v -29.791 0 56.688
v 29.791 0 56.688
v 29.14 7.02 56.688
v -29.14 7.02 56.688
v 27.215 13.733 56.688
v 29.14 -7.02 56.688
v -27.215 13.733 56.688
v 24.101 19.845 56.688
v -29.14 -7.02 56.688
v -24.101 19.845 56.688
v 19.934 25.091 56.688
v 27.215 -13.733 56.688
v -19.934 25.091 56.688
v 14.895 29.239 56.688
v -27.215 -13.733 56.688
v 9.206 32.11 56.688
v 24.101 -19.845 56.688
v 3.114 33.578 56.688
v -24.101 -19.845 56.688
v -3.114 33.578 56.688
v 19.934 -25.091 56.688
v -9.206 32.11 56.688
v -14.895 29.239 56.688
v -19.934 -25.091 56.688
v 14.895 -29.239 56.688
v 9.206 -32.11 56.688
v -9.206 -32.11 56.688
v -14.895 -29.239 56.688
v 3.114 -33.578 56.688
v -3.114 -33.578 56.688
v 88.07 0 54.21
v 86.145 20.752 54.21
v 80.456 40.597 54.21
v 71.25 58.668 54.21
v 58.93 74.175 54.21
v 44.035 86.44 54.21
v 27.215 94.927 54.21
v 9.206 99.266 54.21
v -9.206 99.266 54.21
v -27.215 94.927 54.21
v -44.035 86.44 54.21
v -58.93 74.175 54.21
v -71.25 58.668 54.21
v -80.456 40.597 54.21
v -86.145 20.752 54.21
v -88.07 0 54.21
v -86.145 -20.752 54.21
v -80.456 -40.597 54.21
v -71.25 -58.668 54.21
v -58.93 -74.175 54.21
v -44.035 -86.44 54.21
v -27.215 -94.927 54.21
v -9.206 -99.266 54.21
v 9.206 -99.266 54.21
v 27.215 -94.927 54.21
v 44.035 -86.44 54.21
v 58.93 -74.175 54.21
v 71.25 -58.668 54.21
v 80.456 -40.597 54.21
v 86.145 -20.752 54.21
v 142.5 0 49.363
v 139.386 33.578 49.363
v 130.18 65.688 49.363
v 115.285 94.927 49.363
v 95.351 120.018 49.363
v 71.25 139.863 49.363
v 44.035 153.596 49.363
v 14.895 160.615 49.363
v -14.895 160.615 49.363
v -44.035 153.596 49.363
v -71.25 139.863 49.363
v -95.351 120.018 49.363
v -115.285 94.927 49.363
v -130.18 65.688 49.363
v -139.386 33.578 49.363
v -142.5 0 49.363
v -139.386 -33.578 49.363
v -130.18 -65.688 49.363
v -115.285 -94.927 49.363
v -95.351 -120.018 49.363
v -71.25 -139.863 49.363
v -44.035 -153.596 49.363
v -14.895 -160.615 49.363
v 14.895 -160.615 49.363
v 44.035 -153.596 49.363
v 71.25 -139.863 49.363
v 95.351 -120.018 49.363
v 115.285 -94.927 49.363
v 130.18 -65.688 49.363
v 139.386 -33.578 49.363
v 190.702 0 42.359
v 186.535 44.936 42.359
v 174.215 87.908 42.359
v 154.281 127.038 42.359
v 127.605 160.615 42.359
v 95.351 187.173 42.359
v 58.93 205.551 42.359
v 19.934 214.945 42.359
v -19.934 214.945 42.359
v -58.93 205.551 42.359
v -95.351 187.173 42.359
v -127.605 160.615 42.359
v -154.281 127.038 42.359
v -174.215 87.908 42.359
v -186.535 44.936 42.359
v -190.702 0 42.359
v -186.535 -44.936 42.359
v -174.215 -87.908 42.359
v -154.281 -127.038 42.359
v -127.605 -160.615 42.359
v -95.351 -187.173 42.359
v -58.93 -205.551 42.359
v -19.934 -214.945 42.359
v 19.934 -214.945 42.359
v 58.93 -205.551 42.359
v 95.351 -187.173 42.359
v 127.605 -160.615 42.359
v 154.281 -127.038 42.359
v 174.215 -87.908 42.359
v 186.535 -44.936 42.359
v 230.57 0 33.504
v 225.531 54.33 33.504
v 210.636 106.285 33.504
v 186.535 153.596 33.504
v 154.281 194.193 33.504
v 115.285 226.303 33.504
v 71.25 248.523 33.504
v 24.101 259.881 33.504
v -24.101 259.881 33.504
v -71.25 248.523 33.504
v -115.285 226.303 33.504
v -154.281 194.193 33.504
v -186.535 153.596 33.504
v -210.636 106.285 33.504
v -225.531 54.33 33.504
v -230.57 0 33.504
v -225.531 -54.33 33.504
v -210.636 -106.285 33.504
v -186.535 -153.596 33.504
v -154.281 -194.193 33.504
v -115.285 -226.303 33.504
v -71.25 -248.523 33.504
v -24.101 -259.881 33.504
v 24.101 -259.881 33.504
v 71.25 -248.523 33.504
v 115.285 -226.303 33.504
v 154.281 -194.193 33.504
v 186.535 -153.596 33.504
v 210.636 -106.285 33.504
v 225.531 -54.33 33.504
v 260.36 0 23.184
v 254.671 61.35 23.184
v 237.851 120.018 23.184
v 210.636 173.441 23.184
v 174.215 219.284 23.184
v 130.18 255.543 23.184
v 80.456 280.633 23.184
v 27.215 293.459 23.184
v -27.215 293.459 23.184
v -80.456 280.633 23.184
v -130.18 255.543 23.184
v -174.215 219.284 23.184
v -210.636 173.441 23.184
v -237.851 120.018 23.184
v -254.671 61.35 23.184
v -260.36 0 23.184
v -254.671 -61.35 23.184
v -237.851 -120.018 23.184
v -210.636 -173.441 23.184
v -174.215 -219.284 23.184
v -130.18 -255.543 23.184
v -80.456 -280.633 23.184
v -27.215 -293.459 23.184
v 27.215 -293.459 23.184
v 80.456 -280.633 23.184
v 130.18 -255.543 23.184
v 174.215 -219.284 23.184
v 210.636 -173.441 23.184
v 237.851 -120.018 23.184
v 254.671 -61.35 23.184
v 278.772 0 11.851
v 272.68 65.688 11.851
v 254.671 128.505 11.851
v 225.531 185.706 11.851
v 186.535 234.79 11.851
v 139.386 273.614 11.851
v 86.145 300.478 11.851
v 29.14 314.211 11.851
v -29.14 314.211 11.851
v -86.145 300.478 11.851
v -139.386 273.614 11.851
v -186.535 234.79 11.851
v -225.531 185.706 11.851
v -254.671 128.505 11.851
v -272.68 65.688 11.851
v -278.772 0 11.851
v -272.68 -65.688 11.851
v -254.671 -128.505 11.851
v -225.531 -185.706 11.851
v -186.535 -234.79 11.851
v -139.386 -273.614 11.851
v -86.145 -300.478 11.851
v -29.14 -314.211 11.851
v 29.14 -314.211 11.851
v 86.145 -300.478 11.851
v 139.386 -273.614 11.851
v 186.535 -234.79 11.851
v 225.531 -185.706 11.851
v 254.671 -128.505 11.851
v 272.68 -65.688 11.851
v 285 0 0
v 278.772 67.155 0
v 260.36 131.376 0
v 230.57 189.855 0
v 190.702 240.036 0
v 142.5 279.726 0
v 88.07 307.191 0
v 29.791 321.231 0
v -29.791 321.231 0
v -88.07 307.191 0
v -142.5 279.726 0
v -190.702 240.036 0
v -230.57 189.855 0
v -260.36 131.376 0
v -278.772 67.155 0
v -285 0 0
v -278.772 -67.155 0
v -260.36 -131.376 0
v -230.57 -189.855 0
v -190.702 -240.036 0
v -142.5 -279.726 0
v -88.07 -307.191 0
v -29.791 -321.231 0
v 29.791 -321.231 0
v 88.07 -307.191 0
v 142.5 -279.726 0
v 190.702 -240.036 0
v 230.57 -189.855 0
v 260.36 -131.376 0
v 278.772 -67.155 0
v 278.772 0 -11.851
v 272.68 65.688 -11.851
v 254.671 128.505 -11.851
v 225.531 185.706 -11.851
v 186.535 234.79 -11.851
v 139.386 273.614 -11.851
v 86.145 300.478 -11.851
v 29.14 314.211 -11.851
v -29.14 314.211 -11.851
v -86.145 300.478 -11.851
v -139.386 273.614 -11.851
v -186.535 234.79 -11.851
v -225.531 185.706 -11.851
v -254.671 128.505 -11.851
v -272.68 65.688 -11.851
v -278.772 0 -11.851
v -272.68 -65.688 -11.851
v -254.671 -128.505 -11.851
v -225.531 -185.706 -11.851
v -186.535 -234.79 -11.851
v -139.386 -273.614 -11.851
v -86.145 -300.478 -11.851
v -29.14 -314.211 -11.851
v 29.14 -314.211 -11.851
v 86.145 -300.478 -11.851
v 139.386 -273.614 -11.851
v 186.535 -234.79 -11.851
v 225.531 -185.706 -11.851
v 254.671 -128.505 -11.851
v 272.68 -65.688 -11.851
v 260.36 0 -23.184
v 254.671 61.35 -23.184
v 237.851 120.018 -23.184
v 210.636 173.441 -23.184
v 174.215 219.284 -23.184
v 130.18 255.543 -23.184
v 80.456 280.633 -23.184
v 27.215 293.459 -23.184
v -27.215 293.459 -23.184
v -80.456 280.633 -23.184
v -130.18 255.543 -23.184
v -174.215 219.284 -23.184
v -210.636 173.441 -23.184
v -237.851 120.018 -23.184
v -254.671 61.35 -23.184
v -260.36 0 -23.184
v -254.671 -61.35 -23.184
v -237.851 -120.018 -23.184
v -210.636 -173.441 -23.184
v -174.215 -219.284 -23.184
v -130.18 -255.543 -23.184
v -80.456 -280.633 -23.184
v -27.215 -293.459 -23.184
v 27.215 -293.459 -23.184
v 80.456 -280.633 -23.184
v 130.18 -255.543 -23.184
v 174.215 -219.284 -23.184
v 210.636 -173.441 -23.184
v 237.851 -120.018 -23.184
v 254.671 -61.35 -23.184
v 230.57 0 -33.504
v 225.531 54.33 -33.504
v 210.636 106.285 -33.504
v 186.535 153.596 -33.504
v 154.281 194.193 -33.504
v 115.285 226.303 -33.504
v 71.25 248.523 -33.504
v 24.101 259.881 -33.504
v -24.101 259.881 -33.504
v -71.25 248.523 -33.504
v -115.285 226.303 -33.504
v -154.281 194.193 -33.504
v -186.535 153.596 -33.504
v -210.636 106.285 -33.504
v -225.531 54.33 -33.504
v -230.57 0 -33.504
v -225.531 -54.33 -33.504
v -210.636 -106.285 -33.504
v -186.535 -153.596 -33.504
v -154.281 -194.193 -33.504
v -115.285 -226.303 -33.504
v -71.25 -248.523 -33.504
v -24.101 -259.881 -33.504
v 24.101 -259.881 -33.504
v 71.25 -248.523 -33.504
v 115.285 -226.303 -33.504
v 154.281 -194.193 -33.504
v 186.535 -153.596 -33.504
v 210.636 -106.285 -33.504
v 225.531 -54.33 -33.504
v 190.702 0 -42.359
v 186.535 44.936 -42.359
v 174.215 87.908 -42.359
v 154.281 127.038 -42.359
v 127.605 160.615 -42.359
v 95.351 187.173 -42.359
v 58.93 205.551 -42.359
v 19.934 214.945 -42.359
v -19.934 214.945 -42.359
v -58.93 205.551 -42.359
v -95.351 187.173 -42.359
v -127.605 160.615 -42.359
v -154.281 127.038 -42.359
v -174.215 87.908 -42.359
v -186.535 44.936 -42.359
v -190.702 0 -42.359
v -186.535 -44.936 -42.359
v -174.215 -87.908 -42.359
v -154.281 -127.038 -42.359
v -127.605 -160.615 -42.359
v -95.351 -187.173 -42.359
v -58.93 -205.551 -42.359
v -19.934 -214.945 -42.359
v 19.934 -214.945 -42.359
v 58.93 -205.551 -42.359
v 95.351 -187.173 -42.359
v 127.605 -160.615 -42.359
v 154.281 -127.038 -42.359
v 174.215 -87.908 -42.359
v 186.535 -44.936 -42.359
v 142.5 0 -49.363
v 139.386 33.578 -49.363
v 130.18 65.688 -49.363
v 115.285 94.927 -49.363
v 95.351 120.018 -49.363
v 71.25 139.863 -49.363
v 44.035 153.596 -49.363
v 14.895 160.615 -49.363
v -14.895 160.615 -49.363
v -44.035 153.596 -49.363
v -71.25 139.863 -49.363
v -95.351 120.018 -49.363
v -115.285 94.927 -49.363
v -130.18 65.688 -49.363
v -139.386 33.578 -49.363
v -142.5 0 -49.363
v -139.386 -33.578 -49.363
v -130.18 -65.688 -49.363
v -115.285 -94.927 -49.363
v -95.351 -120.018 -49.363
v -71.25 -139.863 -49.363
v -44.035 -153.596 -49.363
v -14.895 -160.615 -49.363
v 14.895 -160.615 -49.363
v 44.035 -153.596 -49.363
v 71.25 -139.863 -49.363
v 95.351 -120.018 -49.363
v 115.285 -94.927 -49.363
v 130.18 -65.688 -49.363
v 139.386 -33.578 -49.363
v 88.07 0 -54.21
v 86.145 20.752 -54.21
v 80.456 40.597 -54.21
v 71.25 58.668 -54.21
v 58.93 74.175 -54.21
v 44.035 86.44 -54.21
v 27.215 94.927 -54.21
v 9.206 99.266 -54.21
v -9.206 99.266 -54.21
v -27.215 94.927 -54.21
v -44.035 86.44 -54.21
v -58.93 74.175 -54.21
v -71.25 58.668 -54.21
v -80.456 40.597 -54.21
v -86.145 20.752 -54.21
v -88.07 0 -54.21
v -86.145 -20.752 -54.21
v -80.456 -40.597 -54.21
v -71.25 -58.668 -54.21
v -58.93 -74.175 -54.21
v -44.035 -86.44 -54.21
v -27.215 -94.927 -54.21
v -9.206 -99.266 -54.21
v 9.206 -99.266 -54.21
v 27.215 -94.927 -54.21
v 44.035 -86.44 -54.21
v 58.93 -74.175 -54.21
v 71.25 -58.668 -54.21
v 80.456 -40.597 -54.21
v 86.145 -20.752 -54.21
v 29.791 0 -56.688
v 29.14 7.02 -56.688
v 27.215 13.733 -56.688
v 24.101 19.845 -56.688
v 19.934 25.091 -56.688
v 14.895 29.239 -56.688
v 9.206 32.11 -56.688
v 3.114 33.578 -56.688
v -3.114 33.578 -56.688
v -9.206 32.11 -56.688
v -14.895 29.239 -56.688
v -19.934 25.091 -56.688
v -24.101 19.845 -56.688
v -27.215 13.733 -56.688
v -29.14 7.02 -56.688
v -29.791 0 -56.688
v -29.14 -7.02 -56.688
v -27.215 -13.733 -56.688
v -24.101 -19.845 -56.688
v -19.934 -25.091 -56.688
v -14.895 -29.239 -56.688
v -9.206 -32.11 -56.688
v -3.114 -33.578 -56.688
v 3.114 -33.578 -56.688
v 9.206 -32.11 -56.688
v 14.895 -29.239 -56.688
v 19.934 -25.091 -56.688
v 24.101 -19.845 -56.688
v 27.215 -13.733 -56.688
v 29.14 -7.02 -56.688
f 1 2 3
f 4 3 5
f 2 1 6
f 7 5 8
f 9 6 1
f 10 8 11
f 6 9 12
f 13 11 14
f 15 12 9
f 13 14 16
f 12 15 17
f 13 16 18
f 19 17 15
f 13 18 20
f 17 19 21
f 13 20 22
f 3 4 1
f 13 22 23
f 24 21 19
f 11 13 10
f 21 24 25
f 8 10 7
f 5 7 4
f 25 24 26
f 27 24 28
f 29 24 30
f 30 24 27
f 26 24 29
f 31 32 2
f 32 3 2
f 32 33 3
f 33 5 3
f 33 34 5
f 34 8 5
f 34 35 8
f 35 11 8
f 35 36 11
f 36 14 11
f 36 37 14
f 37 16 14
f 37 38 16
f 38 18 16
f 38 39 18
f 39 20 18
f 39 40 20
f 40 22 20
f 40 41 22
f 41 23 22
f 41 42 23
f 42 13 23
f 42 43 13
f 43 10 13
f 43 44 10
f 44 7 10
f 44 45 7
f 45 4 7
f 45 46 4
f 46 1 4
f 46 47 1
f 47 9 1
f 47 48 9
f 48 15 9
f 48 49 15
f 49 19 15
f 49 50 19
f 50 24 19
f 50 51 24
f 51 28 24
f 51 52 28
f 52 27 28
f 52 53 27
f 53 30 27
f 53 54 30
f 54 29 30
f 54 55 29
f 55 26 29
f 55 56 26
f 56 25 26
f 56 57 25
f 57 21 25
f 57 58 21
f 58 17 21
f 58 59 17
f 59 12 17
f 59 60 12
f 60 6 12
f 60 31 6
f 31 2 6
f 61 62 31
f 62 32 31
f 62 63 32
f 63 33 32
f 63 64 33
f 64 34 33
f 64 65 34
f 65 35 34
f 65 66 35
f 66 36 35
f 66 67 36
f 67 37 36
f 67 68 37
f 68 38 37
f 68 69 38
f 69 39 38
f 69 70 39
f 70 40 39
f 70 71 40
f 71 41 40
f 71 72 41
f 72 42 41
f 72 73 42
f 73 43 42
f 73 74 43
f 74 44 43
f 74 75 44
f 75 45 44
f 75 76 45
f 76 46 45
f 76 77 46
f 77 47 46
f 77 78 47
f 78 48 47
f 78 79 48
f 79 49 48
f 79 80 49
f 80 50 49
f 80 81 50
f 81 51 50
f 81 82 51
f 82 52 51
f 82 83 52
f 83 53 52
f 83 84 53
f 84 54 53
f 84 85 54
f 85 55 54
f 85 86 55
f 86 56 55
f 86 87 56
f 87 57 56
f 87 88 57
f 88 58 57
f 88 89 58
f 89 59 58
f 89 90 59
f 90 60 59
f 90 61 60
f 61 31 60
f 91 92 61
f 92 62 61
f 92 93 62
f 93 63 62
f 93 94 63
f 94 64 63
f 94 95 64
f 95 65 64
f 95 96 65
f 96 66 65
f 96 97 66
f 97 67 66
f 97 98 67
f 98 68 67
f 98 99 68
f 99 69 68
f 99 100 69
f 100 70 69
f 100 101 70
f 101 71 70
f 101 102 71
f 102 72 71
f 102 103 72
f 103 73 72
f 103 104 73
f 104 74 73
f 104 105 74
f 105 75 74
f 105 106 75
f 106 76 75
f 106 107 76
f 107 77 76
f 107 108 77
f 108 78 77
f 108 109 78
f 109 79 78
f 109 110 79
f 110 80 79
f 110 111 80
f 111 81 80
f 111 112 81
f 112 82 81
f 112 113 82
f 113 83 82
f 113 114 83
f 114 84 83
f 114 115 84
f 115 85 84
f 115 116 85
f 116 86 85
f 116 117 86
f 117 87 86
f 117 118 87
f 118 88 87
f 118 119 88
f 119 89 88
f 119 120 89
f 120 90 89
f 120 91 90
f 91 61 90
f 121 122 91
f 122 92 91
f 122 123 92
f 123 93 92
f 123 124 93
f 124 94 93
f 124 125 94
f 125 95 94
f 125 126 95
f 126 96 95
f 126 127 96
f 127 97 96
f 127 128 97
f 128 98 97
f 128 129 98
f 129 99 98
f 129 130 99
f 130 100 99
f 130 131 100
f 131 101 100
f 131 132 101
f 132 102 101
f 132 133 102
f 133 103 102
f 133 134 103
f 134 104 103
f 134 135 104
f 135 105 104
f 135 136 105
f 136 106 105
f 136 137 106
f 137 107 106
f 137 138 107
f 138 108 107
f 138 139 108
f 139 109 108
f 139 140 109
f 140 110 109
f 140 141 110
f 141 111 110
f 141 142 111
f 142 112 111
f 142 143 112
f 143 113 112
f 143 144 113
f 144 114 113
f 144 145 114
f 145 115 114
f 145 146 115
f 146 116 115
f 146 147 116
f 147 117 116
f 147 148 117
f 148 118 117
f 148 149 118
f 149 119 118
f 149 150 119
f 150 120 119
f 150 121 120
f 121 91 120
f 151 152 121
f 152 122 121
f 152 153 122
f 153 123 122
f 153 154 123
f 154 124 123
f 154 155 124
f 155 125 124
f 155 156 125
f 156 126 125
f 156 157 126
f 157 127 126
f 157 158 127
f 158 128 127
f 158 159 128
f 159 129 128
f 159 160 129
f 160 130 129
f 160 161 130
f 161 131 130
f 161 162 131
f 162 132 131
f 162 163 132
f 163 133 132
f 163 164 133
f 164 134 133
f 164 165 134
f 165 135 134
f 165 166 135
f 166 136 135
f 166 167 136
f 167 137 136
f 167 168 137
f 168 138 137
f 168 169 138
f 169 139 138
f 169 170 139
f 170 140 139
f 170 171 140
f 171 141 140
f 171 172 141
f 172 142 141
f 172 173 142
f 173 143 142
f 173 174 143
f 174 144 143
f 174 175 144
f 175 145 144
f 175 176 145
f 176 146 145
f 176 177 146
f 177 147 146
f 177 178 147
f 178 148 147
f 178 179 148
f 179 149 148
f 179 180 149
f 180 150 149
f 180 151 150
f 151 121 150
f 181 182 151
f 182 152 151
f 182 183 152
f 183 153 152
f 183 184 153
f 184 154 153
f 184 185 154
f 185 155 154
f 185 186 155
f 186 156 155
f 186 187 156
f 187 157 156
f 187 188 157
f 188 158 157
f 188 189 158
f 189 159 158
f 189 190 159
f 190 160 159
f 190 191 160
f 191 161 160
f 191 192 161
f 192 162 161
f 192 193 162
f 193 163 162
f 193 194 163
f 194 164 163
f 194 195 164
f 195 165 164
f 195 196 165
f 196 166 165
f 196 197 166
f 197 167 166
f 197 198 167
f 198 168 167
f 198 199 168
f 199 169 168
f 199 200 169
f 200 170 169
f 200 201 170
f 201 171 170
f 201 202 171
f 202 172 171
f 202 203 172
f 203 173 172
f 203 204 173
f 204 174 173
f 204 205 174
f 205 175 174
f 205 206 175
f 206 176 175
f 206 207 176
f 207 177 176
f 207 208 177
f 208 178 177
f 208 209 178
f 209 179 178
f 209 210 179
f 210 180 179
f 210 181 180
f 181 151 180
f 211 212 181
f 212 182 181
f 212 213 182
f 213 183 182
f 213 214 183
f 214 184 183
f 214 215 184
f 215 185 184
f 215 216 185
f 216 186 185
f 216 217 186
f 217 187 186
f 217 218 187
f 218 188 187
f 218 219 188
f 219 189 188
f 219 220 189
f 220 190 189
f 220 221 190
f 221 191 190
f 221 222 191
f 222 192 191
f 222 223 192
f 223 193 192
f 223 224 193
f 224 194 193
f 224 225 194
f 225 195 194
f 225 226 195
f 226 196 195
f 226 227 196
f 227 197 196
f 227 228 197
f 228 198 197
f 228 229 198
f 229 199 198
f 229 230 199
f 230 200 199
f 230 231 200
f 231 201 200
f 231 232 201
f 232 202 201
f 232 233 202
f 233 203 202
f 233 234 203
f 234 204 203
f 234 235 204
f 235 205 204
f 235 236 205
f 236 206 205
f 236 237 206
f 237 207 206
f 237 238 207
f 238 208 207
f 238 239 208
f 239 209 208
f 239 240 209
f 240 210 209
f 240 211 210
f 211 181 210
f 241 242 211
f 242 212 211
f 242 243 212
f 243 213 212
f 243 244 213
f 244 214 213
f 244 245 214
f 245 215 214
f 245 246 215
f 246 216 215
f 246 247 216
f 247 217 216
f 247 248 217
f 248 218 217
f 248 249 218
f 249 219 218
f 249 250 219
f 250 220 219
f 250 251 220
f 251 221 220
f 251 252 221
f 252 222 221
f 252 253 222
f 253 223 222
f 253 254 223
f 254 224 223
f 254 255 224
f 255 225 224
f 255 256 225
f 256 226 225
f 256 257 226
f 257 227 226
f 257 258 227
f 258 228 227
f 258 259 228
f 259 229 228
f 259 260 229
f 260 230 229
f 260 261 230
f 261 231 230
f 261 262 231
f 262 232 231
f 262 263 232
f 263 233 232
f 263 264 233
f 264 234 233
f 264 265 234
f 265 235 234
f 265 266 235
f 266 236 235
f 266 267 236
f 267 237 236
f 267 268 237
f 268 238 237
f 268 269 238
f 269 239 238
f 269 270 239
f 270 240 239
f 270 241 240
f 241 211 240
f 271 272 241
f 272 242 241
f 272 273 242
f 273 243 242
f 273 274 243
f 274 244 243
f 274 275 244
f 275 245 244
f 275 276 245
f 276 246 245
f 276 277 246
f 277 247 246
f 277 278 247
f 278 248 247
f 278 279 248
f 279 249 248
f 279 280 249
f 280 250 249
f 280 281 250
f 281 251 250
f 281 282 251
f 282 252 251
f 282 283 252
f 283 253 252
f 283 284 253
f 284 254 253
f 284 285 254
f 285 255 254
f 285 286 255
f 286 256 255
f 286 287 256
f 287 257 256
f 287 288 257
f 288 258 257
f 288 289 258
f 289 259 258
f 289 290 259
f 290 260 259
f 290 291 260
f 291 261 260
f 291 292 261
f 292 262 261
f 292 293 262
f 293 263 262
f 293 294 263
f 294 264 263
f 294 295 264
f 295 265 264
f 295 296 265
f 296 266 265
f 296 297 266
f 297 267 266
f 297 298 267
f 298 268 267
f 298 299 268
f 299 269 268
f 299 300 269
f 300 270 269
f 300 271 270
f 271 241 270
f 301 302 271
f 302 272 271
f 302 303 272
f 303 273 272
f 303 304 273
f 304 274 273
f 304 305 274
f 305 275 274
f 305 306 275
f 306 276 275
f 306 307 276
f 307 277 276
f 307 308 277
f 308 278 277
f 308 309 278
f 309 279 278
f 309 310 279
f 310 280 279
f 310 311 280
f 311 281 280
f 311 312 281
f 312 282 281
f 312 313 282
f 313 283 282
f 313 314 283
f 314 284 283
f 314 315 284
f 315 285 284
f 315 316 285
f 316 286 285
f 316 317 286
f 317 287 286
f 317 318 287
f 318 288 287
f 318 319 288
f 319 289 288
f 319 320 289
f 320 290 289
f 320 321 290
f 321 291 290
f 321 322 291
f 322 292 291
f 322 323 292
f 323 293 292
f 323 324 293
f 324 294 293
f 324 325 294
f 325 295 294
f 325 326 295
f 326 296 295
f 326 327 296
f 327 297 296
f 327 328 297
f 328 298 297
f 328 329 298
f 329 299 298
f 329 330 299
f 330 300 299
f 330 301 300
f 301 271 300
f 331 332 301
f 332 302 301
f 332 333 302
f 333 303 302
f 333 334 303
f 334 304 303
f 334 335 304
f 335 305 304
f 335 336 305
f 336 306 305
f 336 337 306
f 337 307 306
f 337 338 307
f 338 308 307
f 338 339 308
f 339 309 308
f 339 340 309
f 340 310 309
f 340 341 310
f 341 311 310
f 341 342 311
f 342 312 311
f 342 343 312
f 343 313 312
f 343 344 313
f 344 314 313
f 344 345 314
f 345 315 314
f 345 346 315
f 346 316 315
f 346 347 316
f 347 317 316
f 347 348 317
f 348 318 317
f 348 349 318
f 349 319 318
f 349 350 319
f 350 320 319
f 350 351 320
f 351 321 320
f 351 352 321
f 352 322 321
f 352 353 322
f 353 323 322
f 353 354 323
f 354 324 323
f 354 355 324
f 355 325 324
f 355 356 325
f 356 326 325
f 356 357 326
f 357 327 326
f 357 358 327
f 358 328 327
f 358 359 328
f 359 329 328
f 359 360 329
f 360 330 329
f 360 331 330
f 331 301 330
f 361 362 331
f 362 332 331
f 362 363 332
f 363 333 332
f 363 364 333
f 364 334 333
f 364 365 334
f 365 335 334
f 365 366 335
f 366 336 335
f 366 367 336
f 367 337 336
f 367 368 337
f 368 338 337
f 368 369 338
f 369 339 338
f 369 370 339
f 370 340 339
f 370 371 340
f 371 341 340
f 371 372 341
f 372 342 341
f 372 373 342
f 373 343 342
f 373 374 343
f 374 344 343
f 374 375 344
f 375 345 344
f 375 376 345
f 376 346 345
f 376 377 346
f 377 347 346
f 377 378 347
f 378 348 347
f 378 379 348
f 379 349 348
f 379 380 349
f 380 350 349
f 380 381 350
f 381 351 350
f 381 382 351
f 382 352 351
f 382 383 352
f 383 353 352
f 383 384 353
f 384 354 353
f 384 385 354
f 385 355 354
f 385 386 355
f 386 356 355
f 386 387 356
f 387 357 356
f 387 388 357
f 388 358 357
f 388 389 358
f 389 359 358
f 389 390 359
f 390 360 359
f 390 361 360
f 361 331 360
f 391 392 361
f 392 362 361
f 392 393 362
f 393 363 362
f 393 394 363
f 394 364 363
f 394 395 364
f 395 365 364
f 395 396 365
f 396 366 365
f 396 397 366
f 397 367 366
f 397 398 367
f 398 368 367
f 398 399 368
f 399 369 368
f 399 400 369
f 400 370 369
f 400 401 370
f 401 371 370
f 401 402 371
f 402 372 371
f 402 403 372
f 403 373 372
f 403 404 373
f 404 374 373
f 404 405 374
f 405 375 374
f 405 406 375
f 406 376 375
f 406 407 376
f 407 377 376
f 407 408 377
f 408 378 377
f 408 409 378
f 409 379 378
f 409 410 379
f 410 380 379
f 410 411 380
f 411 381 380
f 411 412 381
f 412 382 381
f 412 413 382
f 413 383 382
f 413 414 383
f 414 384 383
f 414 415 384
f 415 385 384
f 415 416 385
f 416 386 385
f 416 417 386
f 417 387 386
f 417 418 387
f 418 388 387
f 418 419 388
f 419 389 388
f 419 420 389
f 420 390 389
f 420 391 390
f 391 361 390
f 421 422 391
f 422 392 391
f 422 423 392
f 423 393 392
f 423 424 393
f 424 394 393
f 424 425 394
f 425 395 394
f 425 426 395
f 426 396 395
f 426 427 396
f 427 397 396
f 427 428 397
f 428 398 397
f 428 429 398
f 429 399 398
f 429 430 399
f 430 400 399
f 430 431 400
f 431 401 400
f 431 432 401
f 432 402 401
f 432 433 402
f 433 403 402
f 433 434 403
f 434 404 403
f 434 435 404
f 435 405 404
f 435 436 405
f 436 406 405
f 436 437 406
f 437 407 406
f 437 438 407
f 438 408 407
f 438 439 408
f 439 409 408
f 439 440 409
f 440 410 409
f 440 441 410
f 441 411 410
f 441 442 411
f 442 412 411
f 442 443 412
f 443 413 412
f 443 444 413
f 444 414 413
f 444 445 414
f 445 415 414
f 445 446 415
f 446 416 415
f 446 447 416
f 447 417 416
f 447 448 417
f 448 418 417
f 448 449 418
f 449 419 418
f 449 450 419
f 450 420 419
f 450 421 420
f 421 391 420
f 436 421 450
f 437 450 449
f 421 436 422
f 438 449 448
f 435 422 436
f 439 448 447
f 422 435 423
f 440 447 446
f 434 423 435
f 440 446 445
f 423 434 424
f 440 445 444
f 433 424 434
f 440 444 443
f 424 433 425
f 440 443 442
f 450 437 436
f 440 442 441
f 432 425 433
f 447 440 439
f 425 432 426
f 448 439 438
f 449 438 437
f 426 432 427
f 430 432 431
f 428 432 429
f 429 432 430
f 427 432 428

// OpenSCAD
// Generated by SolidPython 1.0.1 on 2020-07-29 00:46:52


scale(v = [15, 17, 3]) {
	sphere(r = 19);
}
/***********************************************
*********      SolidPython code:      **********
************************************************
 
# import packages: SolidPython
from solid import *
from solid.utils import *
from itertools import chain, combinations, permutations


class Resize:

    def __init__(self, scad_file):
        self.scad_file = scad_file
        #self.scad_file = import_scad(scad_file)
        # cone/cylinder param:
        self.r1 = 0
        self.r2 = 0
        self.h = 0
        # rectangular prism param:
        self.w = 0
        self.l = 0
        # ellipse param:
        self.r = 0

    # import OpenScad code (file name corresponds to shape)


    # classify shape + parameters
    def assign(self, param1, param2, param3):
        if self.scad_file == 'cone.scad':
            self.r1 = param1
            self.r2 = param2
            self.h = param3
        elif self.scad_file == 'cylinder.scad':
            self.r1 = param1
            self.r2 = param2
            self.h = param3
        elif self.scad_file == 'rectangularPrism.scad':
            self.h = param1
            self.l = param2
            self.w = param3
        else:
            self.r = param1
            self.h = param2

    # resize parameters
    def iterate(self):
        x = range(3, 20, 2)
        i = 1
        if self.scad_file == 'cone.scad':
            tempList = list(permutations(x, 2))
            for temp in tempList:
                param1 = temp[0]
                param2 = temp[1]
                filepath = 'produced_scad_files/' + 'cone' + str(param1) + '_' + str(param2) + '_' + '.scad'
                scad_render_to_file(cylinder(h=param1, r1=param2, r2=0), filepath)

        elif self.scad_file == 'cylinder.scad':
            tempList = list(permutations(x, 3))
            for temp in tempList:
                param1 = temp[0]
                param2 = temp[1]
                filepath = 'produced_scad_files/' + 'cylinder' + str(param1) + '_' + str(param2) + '_' + '.scad'
                scad_render_to_file(cylinder(h=param1, r1=param2, r2=param2), filepath)

        elif self.scad_file == 'rectangularPrism.scad':
            tempList = list(permutations(x, 3))
            for temp in tempList:
                param1 = temp[0]
                param2 = temp[1]
                param3 = temp[2]
                filepath = 'produced_scad_files/' + 'rectangularPrism' + str(param1) + '_' + str(param2) + '_' + str(
                    param3) + '.scad'
                scad_render_to_file(cube(size=(param1, param2, param3)), filepath)

        elif self.scad_file == 'ellipse.scad':
            tempList = list(permutations(x, 4))
            for temp in tempList:
                param1 = temp[0]
                param2 = temp[1]
                param3 = temp[2]
                param4 = temp[3]
                filepath = 'produced_scad_files/' + 'ellipse' + str(param1) + '_' + str(param2) + '_' + str(param3) + '_' + str(param4) + '.scad'
                scad_render_to_file(scale([param1, param2, param3])(sphere(r=param4)), filepath)

    def render_to_scadfile(self):
        scad_render_to_file(scad, 'example.scad') 
 
************************************************/
